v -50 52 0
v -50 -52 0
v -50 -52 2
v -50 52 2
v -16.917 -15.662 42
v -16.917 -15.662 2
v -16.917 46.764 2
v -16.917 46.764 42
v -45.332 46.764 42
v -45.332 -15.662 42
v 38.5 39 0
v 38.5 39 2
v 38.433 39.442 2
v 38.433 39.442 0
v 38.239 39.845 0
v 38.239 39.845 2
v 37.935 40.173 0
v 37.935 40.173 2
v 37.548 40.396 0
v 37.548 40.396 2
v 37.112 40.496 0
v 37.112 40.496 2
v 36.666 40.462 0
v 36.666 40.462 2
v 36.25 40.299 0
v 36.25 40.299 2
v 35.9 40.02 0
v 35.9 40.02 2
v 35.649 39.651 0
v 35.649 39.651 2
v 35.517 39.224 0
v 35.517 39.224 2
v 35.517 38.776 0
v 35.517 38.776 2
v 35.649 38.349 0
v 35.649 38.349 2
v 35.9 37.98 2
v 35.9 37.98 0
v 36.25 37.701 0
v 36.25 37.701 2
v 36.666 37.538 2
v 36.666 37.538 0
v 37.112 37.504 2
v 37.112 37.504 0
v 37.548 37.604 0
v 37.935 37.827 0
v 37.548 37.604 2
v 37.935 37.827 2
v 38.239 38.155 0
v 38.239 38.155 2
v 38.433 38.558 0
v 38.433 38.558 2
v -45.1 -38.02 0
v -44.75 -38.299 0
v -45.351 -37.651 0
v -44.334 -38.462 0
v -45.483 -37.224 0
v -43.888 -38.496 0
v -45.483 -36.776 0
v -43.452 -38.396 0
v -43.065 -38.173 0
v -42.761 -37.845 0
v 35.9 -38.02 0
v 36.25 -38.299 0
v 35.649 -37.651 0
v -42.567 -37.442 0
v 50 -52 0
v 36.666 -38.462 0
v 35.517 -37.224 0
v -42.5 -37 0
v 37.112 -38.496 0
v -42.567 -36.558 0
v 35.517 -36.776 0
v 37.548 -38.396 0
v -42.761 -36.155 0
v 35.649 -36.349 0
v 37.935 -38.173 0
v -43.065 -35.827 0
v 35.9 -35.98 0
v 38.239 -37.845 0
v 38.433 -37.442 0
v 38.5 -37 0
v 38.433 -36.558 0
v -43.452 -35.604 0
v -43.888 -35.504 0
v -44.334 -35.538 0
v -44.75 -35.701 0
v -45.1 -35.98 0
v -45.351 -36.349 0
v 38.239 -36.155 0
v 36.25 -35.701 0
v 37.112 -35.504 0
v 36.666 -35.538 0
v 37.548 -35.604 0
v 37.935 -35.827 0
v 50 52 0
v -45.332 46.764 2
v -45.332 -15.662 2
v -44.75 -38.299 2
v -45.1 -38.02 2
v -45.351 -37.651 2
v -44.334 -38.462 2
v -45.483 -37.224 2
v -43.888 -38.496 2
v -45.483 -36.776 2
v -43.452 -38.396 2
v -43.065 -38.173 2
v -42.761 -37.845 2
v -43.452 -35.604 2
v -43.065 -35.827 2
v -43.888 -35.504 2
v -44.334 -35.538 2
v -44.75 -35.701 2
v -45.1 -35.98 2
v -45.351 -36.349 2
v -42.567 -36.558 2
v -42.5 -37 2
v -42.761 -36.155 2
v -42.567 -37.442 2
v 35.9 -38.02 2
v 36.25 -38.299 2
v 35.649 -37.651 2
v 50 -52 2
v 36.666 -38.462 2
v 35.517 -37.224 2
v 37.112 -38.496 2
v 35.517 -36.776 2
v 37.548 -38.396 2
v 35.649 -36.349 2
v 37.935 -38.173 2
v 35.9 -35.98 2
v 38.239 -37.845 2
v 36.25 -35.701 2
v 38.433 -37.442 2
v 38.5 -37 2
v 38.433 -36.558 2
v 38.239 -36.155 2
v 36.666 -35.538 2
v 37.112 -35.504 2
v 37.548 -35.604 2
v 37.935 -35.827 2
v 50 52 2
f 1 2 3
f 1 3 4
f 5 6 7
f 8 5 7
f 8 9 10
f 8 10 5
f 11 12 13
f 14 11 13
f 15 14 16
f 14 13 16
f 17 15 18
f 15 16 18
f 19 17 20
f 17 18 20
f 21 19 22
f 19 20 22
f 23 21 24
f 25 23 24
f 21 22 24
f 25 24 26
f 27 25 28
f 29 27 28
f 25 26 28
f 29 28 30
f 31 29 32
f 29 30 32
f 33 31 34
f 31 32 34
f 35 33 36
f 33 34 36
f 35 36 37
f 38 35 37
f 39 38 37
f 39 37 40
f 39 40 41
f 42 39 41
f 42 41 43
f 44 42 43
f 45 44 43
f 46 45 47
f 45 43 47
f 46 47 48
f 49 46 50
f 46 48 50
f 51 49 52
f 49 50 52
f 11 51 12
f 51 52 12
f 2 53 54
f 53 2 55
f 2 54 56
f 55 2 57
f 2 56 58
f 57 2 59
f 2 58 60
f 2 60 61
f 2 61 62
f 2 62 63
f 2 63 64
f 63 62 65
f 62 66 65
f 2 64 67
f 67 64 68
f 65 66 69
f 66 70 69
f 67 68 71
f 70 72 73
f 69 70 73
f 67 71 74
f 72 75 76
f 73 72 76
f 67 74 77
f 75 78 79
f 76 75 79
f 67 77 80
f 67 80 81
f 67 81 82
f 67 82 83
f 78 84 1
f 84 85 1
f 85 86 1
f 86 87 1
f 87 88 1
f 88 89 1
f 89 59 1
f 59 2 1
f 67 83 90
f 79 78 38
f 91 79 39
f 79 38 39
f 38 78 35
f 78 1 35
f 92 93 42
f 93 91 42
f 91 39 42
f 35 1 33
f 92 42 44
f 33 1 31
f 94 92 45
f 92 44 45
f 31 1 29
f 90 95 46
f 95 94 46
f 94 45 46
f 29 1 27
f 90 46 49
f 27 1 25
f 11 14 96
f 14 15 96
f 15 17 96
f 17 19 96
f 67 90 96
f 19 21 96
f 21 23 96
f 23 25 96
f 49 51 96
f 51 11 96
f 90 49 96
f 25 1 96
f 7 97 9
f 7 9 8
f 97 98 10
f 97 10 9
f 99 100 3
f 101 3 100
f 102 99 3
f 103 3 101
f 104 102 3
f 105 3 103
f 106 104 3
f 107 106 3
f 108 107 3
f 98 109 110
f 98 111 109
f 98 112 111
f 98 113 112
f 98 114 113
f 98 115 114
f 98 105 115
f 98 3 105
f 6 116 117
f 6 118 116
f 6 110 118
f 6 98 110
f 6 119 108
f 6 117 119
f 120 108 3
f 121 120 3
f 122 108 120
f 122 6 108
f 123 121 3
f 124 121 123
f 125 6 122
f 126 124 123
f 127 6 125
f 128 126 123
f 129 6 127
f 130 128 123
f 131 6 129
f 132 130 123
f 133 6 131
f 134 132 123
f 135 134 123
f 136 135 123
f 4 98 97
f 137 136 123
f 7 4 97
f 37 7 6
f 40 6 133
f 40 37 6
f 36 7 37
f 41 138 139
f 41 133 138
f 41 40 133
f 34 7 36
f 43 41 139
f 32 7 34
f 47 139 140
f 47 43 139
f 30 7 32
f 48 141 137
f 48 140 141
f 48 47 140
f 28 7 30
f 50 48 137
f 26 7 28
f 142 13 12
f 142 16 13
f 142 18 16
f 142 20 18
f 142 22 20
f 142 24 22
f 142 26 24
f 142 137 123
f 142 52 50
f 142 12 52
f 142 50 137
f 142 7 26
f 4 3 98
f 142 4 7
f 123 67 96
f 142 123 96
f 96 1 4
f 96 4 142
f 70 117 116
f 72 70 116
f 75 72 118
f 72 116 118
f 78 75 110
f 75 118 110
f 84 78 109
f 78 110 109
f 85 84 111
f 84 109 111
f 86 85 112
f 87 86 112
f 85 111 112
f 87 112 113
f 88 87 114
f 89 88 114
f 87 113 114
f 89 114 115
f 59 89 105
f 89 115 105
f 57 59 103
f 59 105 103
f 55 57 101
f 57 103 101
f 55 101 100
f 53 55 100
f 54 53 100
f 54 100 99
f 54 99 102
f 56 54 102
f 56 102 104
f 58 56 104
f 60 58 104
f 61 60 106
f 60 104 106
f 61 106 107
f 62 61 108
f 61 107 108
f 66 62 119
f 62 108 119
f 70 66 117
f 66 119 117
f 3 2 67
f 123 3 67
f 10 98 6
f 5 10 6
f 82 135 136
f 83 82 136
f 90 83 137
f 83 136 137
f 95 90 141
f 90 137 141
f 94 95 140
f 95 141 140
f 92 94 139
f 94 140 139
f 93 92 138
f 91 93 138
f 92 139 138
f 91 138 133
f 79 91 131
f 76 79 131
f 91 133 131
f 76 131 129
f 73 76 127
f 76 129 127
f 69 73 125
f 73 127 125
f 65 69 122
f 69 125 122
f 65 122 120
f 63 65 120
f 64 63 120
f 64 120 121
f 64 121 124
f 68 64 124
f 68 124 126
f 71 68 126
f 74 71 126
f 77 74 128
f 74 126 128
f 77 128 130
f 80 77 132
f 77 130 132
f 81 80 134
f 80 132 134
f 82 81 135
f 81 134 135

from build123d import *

# Parameters (mm, degrees)
SKETCH1_W           = 100
SKETCH1_H           = 104
BOSS_EXTRUDE1_DEPTH = 2
SKETCH2_R           = 1.5
CUT_EXTRUDE1_DEPTH  = 2
SKETCH3_W           = 28.414936843
SKETCH3_H           = 62.425741265
BOSS_EXTRUDE2_DEPTH = 40


with BuildPart() as part:
    # Sketch1 → Boss-Extrude1 (new body)
    with BuildSketch(Plane.XY):
        Rectangle(SKETCH1_W, SKETCH1_H)
    extrude(amount=BOSS_EXTRUDE1_DEPTH)

    # Sketch2 → Cut-Extrude1 (cut)
    with BuildSketch(Plane.XY.offset(2)):
        with Locations((-44, -37)):
            Circle(SKETCH2_R)
        with Locations((37, -37)):
            Circle(SKETCH2_R)
        with Locations((37, 39)):
            Circle(SKETCH2_R)
    extrude(amount=-CUT_EXTRUDE1_DEPTH, mode=Mode.SUBTRACT)

    # Sketch3 → Boss-Extrude2 (add)
    with BuildSketch(Plane.XY.offset(2)):
        with Locations((-31.124449574, 15.550972076)):
            Rectangle(SKETCH3_W, SKETCH3_H)
    extrude(amount=BOSS_EXTRUDE2_DEPTH)


solid = part.part
